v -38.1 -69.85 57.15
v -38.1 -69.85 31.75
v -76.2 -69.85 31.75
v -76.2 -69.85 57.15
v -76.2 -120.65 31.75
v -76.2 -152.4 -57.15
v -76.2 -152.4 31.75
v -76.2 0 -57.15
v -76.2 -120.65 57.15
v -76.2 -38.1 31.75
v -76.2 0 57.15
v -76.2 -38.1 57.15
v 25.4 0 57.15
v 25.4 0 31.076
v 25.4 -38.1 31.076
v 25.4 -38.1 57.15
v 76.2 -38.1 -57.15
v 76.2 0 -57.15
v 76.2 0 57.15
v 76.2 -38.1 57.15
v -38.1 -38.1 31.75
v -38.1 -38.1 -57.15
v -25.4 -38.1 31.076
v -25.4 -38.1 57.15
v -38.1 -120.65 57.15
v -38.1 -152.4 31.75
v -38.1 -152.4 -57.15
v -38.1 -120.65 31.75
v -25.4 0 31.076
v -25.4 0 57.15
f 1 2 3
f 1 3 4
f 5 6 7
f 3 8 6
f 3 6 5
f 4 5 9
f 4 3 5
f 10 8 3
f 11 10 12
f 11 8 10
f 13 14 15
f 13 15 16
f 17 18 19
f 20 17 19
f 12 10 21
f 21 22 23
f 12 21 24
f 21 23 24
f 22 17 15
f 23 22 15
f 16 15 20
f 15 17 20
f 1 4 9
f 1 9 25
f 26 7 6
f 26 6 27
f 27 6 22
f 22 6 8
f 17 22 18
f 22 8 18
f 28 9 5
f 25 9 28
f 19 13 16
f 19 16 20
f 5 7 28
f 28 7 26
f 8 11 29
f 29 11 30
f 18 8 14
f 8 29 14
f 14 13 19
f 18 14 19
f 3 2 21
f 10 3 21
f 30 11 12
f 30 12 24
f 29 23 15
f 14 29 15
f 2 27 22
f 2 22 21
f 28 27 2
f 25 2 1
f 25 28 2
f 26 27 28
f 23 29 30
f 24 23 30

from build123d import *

# Parameters (mm, degrees)
F0_W     = 152.4
F0_H     = 114.3
F1_DEPTH = 152.4
F2_W     = 114.3
F2_H     = 114.3
F3_DEPTH = 114.3
F4_W     = 38.1
F4_H     = 25.4
F5_DEPTH = 31.75
F6_W     = 31.75
F6_H     = 25.4
F7_DEPTH = 38.101
F8_W     = 50.8
F8_H     = 26.0741613155
F9_DEPTH = 38.101


with BuildPart() as f1:
    # F0 (on Front) → F1 (new body)
    with BuildSketch(Plane.XZ):
        Rectangle(F0_W, F0_H)
    extrude(amount=F1_DEPTH)

    # F2 (on face) → F3 (cut)
    with BuildSketch(Plane.XZ.offset(152.4)):
        with Locations((19.05, 0)):
            Rectangle(F2_W, F2_H)
    extrude(amount=-F3_DEPTH, mode=Mode.SUBTRACT)

    # F4 (on face) → F5 (cut)
    with BuildSketch(Plane.XZ.offset(152.4)):
        with Locations((-57.15, 44.45)):
            Rectangle(F4_W, F4_H)
    extrude(amount=-F5_DEPTH, mode=Mode.SUBTRACT)

    # F6 (on face) → F7 (cut, through all)
    with BuildSketch(Plane.YZ.offset(-38.1)):
        with Locations((-53.975, 44.45)):
            Rectangle(F6_W, F6_H)
    extrude(amount=-F7_DEPTH, mode=Mode.SUBTRACT)

    # F8 (on face) → F9 (cut, through all)
    with BuildSketch(Plane.XZ.offset(38.1)):
        with Locations((0, 44.1129193423)):
            Rectangle(F8_W, F8_H)
    extrude(amount=-F9_DEPTH, mode=Mode.SUBTRACT)


solid = f1.part
